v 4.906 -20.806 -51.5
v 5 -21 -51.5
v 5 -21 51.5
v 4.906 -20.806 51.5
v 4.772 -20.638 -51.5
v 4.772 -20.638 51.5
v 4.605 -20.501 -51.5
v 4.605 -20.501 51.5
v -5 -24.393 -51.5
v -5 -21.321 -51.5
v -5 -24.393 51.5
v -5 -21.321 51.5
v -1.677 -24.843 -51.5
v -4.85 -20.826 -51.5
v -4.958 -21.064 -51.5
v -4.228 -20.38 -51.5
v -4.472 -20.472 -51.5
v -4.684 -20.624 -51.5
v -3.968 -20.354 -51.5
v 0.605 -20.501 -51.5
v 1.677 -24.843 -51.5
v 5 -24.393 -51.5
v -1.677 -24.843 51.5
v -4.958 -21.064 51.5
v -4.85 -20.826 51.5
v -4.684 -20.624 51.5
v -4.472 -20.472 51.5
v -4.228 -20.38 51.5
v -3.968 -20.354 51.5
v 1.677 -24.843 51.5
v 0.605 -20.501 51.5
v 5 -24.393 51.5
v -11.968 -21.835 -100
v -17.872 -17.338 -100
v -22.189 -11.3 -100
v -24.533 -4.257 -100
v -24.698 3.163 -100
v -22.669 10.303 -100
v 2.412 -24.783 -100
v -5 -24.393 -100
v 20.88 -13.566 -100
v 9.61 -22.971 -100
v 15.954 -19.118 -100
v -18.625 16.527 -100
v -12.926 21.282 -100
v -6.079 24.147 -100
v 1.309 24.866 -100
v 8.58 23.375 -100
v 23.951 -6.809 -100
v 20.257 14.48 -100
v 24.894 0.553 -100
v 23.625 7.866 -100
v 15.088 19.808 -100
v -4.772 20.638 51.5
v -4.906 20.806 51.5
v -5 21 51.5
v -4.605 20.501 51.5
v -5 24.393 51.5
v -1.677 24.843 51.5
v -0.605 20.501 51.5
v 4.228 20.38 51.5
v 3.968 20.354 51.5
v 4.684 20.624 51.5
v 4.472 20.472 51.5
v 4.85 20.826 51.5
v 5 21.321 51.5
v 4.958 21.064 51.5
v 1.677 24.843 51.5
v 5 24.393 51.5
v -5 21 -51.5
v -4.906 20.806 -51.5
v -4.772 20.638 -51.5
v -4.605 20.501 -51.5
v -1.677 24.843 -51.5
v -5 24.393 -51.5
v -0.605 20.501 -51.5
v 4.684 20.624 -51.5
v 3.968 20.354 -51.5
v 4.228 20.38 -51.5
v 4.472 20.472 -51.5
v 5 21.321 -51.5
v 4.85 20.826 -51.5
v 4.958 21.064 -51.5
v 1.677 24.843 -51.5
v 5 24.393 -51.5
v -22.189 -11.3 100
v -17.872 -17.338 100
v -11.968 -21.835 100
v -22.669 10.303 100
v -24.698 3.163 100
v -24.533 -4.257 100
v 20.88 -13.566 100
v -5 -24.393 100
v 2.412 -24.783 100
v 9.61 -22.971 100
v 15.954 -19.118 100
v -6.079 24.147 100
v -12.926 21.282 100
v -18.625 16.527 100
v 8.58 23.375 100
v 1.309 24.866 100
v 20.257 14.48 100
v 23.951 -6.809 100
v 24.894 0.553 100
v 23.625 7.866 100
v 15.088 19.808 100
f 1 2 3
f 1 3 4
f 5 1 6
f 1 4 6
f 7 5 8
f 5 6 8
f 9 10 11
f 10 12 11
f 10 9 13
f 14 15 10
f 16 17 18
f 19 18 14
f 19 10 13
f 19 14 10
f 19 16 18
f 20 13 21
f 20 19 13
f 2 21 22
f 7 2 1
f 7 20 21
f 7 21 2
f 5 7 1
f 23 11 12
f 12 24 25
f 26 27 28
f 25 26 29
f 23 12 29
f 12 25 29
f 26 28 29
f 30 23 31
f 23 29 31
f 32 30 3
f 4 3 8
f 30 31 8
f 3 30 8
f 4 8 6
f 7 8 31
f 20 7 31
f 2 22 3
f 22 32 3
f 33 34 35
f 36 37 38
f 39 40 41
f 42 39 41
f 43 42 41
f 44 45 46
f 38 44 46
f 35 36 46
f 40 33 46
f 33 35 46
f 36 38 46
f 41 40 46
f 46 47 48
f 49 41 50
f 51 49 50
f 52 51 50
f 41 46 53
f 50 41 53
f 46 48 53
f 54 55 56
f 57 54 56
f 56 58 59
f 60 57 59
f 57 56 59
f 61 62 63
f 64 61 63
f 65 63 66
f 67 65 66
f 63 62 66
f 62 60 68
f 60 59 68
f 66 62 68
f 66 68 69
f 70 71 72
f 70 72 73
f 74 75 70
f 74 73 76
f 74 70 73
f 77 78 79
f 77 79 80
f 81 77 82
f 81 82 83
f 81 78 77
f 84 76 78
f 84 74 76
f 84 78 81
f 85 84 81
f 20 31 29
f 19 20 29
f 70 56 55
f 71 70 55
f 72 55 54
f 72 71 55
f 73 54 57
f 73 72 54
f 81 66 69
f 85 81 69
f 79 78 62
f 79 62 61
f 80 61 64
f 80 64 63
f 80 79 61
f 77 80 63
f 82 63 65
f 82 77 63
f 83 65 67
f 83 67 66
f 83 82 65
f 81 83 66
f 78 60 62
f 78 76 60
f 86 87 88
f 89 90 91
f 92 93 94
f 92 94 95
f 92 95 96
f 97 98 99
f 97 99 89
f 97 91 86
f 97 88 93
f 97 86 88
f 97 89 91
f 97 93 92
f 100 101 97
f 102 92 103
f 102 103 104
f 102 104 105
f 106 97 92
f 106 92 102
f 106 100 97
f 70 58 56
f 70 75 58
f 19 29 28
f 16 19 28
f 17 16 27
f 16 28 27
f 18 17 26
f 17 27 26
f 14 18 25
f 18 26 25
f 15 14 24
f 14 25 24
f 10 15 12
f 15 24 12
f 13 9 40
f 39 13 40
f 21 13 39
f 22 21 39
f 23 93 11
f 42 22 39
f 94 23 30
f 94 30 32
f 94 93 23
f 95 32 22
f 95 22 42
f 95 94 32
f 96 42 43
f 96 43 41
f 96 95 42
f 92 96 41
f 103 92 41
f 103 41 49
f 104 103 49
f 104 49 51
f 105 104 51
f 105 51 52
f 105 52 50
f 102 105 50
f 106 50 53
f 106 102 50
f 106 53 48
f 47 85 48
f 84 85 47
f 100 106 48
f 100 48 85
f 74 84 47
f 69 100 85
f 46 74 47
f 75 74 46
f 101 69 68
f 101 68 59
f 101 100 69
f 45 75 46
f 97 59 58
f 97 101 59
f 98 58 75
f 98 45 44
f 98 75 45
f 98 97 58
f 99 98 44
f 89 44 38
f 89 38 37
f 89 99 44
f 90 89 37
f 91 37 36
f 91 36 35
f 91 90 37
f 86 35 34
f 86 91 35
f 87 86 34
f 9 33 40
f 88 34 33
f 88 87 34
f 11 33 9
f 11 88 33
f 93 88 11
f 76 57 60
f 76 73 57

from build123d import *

# Parameters (mm, degrees)
MODEL_R                     = 24.9
Y_KSEKLIK_EKSTR_ZYON2_DEPTH = 100
KES_EKSTR_ZYON1_DEPTH       = 51.5


with BuildPart() as part:
    # Model → Yükseklik-Ekstrüzyon2 (new, symmetric)
    with BuildSketch(Plane.XY):
        Circle(MODEL_R)
    extrude(amount=Y_KSEKLIK_EKSTR_ZYON2_DEPTH, both=True)

    # Model<12> → Kes-Ekstrüzyon1 (cut, symmetric)
    with BuildSketch(Plane.XY):
        with BuildLine():
            Line((5, -24.392826814), (5, -21))
            ThreePointArc((5, -21), (4.843352342, -20.718418144), (4.605290304, -20.501270048))
            Line((4.605290304, -20.501270048), (0.605290304, -20.501270048))
            Line((0.605290304, -20.501270048), (-3.968312881, -20.353896765))
            ThreePointArc((-3.968312881, -20.353896765), (-4.684485734, -20.623865064), (-5, -21.321172159))
            Line((-5, -21.321172159), (-5, -24.392826814))
            ThreePointArc((-5, -24.392826814), (0, -24.9), (5, -24.392826814))
        make_face()
        with BuildLine():
            ThreePointArc((5, 24.392826814), (0, 24.9), (-5, 24.392826814))
            Line((-5, 24.392826814), (-5, 21))
            ThreePointArc((-5, 21), (-4.843352342, 20.718418144), (-4.605290304, 20.501270048))
            Line((-4.605290304, 20.501270048), (-0.605290304, 20.501270048))
            Line((-0.605290304, 20.501270048), (3.968312881, 20.353896765))
            ThreePointArc((3.968312881, 20.353896765), (4.684485734, 20.623865064), (5, 21.321172159))
            Line((5, 21.321172159), (5, 24.392826814))
        make_face()
    extrude(amount=KES_EKSTR_ZYON1_DEPTH, both=True, mode=Mode.SUBTRACT)


solid = part.part
